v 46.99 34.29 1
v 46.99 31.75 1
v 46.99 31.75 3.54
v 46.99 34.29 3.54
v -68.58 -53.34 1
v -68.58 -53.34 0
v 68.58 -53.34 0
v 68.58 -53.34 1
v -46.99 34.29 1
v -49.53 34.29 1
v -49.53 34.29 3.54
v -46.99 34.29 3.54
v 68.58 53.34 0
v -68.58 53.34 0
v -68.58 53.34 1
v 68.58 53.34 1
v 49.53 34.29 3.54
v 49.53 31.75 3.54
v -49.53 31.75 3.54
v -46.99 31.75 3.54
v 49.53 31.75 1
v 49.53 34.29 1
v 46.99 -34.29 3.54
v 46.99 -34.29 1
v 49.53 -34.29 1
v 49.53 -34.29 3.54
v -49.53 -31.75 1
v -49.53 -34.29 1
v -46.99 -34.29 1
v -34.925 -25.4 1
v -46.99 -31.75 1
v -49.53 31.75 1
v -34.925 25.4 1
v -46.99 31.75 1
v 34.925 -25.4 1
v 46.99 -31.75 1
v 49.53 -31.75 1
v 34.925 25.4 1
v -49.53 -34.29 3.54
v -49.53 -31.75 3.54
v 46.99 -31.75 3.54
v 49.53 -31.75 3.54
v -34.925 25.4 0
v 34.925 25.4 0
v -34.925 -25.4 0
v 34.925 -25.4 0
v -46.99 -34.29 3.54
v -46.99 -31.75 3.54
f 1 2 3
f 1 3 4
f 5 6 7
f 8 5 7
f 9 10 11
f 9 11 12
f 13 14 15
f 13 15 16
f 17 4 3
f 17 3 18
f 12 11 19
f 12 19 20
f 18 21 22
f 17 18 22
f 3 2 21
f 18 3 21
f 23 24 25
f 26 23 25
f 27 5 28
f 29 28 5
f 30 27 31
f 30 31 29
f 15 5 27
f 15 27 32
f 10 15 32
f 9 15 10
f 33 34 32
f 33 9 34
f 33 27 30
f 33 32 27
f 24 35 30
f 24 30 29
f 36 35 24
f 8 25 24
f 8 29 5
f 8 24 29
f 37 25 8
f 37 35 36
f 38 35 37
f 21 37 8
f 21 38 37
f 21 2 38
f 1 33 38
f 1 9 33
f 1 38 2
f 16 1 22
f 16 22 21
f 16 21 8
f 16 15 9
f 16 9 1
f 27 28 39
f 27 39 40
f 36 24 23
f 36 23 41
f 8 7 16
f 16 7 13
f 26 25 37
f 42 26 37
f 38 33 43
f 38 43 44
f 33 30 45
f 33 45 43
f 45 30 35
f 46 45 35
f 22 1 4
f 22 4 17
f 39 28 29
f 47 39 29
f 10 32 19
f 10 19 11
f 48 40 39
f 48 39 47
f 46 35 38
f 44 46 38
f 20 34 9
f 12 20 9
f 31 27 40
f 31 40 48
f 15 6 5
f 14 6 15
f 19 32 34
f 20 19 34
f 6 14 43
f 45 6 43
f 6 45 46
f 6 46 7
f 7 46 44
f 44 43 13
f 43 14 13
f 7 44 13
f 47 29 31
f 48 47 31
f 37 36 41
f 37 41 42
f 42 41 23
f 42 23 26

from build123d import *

# Parameters (mm, degrees)
SKETCH1_W           = 137.16
SKETCH1_H           = 106.68
BOSS_EXTRUDE1_DEPTH = 1
SKETCH4_W           = 2.54
SKETCH4_H           = 2.54
BOSS_EXTRUDE2_DEPTH = 2.54
SKETCH5_W           = 69.85
SKETCH5_H           = 50.8
CUT_EXTRUDE1_DEPTH  = 2.54


with BuildPart() as part:
    # Sketch1 → Boss-Extrude1 (new body)
    with BuildSketch(Plane.XY):
        Rectangle(SKETCH1_W, SKETCH1_H)
    extrude(amount=BOSS_EXTRUDE1_DEPTH)

    # Sketch4 → Boss-Extrude2 (add)
    with BuildSketch(Plane.XY.offset(1)):
        with Locations((-48.26, 33.02)):
            Rectangle(SKETCH4_W, SKETCH4_H)
        with Locations((48.26, 33.02)):
            Rectangle(SKETCH4_W, SKETCH4_H)
        with Locations((48.26, -33.02)):
            Rectangle(SKETCH4_W, SKETCH4_H)
        with Locations((-48.26, -33.02)):
            Rectangle(SKETCH4_W, SKETCH4_H)
    extrude(amount=BOSS_EXTRUDE2_DEPTH)

    # Sketch5 → Cut-Extrude1 (cut)
    with BuildSketch(Plane.XY.offset(1)):
        Rectangle(SKETCH5_W, SKETCH5_H)
    extrude(amount=-CUT_EXTRUDE1_DEPTH, mode=Mode.SUBTRACT)


solid = part.part
